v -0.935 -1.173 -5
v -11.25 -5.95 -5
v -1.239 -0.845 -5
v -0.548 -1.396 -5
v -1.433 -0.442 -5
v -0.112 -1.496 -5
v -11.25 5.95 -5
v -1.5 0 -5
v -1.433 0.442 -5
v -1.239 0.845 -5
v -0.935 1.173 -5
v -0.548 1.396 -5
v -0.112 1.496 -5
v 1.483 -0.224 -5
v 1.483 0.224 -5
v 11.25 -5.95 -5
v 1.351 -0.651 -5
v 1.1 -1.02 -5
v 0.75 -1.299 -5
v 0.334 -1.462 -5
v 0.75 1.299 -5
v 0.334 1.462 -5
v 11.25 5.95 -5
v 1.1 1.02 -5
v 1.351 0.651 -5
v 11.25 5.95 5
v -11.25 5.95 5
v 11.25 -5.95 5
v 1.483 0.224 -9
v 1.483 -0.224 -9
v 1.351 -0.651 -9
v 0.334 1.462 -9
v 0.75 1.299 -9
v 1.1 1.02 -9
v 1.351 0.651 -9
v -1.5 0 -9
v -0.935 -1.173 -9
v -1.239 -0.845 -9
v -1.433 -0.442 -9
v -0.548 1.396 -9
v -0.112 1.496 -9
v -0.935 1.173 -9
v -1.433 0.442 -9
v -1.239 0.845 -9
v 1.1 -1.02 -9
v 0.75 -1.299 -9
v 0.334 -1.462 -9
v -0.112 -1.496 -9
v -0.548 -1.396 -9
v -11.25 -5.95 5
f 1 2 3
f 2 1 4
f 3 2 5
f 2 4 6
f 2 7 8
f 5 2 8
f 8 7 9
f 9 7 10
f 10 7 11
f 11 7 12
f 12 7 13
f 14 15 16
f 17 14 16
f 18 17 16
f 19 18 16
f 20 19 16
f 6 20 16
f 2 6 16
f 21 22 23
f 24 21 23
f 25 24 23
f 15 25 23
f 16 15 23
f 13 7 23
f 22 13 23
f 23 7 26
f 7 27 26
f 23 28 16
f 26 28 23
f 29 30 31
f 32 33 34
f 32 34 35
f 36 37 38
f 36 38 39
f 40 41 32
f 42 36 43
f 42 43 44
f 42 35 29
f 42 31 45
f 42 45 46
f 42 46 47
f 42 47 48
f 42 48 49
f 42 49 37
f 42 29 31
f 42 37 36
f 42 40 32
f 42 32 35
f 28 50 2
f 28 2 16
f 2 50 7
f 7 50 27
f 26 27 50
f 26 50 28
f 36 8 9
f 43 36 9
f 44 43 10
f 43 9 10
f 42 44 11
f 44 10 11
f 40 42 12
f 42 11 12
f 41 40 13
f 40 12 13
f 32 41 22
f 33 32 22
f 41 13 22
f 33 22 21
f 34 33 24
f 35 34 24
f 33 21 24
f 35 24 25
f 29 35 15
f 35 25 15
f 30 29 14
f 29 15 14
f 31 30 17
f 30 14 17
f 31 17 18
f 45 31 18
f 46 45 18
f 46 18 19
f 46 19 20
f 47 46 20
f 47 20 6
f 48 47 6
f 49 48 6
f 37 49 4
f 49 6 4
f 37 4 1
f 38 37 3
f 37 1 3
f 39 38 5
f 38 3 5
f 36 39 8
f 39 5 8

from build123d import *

# Parameters (mm, degrees)
SKETCH1_W           = 22.5
SKETCH1_H           = 11.9
BOSS_EXTRUDE1_DEPTH = 5
SKETCH2_R           = 1.5
BOSS_EXTRUDE2_DEPTH = 4


with BuildPart() as part:
    # Sketch1 → Boss-Extrude1 (new body, symmetric)
    with BuildSketch(Plane.XY):
        Rectangle(SKETCH1_W, SKETCH1_H)
    extrude(amount=BOSS_EXTRUDE1_DEPTH, both=True)

    # Sketch2 → Boss-Extrude2 (add)
    with BuildSketch(Plane(origin=(0, 0, -5), x_dir=(-1, 0, 0), z_dir=(0, 0, -1))):
        Circle(SKETCH2_R)
    extrude(amount=BOSS_EXTRUDE2_DEPTH)


solid = part.part
